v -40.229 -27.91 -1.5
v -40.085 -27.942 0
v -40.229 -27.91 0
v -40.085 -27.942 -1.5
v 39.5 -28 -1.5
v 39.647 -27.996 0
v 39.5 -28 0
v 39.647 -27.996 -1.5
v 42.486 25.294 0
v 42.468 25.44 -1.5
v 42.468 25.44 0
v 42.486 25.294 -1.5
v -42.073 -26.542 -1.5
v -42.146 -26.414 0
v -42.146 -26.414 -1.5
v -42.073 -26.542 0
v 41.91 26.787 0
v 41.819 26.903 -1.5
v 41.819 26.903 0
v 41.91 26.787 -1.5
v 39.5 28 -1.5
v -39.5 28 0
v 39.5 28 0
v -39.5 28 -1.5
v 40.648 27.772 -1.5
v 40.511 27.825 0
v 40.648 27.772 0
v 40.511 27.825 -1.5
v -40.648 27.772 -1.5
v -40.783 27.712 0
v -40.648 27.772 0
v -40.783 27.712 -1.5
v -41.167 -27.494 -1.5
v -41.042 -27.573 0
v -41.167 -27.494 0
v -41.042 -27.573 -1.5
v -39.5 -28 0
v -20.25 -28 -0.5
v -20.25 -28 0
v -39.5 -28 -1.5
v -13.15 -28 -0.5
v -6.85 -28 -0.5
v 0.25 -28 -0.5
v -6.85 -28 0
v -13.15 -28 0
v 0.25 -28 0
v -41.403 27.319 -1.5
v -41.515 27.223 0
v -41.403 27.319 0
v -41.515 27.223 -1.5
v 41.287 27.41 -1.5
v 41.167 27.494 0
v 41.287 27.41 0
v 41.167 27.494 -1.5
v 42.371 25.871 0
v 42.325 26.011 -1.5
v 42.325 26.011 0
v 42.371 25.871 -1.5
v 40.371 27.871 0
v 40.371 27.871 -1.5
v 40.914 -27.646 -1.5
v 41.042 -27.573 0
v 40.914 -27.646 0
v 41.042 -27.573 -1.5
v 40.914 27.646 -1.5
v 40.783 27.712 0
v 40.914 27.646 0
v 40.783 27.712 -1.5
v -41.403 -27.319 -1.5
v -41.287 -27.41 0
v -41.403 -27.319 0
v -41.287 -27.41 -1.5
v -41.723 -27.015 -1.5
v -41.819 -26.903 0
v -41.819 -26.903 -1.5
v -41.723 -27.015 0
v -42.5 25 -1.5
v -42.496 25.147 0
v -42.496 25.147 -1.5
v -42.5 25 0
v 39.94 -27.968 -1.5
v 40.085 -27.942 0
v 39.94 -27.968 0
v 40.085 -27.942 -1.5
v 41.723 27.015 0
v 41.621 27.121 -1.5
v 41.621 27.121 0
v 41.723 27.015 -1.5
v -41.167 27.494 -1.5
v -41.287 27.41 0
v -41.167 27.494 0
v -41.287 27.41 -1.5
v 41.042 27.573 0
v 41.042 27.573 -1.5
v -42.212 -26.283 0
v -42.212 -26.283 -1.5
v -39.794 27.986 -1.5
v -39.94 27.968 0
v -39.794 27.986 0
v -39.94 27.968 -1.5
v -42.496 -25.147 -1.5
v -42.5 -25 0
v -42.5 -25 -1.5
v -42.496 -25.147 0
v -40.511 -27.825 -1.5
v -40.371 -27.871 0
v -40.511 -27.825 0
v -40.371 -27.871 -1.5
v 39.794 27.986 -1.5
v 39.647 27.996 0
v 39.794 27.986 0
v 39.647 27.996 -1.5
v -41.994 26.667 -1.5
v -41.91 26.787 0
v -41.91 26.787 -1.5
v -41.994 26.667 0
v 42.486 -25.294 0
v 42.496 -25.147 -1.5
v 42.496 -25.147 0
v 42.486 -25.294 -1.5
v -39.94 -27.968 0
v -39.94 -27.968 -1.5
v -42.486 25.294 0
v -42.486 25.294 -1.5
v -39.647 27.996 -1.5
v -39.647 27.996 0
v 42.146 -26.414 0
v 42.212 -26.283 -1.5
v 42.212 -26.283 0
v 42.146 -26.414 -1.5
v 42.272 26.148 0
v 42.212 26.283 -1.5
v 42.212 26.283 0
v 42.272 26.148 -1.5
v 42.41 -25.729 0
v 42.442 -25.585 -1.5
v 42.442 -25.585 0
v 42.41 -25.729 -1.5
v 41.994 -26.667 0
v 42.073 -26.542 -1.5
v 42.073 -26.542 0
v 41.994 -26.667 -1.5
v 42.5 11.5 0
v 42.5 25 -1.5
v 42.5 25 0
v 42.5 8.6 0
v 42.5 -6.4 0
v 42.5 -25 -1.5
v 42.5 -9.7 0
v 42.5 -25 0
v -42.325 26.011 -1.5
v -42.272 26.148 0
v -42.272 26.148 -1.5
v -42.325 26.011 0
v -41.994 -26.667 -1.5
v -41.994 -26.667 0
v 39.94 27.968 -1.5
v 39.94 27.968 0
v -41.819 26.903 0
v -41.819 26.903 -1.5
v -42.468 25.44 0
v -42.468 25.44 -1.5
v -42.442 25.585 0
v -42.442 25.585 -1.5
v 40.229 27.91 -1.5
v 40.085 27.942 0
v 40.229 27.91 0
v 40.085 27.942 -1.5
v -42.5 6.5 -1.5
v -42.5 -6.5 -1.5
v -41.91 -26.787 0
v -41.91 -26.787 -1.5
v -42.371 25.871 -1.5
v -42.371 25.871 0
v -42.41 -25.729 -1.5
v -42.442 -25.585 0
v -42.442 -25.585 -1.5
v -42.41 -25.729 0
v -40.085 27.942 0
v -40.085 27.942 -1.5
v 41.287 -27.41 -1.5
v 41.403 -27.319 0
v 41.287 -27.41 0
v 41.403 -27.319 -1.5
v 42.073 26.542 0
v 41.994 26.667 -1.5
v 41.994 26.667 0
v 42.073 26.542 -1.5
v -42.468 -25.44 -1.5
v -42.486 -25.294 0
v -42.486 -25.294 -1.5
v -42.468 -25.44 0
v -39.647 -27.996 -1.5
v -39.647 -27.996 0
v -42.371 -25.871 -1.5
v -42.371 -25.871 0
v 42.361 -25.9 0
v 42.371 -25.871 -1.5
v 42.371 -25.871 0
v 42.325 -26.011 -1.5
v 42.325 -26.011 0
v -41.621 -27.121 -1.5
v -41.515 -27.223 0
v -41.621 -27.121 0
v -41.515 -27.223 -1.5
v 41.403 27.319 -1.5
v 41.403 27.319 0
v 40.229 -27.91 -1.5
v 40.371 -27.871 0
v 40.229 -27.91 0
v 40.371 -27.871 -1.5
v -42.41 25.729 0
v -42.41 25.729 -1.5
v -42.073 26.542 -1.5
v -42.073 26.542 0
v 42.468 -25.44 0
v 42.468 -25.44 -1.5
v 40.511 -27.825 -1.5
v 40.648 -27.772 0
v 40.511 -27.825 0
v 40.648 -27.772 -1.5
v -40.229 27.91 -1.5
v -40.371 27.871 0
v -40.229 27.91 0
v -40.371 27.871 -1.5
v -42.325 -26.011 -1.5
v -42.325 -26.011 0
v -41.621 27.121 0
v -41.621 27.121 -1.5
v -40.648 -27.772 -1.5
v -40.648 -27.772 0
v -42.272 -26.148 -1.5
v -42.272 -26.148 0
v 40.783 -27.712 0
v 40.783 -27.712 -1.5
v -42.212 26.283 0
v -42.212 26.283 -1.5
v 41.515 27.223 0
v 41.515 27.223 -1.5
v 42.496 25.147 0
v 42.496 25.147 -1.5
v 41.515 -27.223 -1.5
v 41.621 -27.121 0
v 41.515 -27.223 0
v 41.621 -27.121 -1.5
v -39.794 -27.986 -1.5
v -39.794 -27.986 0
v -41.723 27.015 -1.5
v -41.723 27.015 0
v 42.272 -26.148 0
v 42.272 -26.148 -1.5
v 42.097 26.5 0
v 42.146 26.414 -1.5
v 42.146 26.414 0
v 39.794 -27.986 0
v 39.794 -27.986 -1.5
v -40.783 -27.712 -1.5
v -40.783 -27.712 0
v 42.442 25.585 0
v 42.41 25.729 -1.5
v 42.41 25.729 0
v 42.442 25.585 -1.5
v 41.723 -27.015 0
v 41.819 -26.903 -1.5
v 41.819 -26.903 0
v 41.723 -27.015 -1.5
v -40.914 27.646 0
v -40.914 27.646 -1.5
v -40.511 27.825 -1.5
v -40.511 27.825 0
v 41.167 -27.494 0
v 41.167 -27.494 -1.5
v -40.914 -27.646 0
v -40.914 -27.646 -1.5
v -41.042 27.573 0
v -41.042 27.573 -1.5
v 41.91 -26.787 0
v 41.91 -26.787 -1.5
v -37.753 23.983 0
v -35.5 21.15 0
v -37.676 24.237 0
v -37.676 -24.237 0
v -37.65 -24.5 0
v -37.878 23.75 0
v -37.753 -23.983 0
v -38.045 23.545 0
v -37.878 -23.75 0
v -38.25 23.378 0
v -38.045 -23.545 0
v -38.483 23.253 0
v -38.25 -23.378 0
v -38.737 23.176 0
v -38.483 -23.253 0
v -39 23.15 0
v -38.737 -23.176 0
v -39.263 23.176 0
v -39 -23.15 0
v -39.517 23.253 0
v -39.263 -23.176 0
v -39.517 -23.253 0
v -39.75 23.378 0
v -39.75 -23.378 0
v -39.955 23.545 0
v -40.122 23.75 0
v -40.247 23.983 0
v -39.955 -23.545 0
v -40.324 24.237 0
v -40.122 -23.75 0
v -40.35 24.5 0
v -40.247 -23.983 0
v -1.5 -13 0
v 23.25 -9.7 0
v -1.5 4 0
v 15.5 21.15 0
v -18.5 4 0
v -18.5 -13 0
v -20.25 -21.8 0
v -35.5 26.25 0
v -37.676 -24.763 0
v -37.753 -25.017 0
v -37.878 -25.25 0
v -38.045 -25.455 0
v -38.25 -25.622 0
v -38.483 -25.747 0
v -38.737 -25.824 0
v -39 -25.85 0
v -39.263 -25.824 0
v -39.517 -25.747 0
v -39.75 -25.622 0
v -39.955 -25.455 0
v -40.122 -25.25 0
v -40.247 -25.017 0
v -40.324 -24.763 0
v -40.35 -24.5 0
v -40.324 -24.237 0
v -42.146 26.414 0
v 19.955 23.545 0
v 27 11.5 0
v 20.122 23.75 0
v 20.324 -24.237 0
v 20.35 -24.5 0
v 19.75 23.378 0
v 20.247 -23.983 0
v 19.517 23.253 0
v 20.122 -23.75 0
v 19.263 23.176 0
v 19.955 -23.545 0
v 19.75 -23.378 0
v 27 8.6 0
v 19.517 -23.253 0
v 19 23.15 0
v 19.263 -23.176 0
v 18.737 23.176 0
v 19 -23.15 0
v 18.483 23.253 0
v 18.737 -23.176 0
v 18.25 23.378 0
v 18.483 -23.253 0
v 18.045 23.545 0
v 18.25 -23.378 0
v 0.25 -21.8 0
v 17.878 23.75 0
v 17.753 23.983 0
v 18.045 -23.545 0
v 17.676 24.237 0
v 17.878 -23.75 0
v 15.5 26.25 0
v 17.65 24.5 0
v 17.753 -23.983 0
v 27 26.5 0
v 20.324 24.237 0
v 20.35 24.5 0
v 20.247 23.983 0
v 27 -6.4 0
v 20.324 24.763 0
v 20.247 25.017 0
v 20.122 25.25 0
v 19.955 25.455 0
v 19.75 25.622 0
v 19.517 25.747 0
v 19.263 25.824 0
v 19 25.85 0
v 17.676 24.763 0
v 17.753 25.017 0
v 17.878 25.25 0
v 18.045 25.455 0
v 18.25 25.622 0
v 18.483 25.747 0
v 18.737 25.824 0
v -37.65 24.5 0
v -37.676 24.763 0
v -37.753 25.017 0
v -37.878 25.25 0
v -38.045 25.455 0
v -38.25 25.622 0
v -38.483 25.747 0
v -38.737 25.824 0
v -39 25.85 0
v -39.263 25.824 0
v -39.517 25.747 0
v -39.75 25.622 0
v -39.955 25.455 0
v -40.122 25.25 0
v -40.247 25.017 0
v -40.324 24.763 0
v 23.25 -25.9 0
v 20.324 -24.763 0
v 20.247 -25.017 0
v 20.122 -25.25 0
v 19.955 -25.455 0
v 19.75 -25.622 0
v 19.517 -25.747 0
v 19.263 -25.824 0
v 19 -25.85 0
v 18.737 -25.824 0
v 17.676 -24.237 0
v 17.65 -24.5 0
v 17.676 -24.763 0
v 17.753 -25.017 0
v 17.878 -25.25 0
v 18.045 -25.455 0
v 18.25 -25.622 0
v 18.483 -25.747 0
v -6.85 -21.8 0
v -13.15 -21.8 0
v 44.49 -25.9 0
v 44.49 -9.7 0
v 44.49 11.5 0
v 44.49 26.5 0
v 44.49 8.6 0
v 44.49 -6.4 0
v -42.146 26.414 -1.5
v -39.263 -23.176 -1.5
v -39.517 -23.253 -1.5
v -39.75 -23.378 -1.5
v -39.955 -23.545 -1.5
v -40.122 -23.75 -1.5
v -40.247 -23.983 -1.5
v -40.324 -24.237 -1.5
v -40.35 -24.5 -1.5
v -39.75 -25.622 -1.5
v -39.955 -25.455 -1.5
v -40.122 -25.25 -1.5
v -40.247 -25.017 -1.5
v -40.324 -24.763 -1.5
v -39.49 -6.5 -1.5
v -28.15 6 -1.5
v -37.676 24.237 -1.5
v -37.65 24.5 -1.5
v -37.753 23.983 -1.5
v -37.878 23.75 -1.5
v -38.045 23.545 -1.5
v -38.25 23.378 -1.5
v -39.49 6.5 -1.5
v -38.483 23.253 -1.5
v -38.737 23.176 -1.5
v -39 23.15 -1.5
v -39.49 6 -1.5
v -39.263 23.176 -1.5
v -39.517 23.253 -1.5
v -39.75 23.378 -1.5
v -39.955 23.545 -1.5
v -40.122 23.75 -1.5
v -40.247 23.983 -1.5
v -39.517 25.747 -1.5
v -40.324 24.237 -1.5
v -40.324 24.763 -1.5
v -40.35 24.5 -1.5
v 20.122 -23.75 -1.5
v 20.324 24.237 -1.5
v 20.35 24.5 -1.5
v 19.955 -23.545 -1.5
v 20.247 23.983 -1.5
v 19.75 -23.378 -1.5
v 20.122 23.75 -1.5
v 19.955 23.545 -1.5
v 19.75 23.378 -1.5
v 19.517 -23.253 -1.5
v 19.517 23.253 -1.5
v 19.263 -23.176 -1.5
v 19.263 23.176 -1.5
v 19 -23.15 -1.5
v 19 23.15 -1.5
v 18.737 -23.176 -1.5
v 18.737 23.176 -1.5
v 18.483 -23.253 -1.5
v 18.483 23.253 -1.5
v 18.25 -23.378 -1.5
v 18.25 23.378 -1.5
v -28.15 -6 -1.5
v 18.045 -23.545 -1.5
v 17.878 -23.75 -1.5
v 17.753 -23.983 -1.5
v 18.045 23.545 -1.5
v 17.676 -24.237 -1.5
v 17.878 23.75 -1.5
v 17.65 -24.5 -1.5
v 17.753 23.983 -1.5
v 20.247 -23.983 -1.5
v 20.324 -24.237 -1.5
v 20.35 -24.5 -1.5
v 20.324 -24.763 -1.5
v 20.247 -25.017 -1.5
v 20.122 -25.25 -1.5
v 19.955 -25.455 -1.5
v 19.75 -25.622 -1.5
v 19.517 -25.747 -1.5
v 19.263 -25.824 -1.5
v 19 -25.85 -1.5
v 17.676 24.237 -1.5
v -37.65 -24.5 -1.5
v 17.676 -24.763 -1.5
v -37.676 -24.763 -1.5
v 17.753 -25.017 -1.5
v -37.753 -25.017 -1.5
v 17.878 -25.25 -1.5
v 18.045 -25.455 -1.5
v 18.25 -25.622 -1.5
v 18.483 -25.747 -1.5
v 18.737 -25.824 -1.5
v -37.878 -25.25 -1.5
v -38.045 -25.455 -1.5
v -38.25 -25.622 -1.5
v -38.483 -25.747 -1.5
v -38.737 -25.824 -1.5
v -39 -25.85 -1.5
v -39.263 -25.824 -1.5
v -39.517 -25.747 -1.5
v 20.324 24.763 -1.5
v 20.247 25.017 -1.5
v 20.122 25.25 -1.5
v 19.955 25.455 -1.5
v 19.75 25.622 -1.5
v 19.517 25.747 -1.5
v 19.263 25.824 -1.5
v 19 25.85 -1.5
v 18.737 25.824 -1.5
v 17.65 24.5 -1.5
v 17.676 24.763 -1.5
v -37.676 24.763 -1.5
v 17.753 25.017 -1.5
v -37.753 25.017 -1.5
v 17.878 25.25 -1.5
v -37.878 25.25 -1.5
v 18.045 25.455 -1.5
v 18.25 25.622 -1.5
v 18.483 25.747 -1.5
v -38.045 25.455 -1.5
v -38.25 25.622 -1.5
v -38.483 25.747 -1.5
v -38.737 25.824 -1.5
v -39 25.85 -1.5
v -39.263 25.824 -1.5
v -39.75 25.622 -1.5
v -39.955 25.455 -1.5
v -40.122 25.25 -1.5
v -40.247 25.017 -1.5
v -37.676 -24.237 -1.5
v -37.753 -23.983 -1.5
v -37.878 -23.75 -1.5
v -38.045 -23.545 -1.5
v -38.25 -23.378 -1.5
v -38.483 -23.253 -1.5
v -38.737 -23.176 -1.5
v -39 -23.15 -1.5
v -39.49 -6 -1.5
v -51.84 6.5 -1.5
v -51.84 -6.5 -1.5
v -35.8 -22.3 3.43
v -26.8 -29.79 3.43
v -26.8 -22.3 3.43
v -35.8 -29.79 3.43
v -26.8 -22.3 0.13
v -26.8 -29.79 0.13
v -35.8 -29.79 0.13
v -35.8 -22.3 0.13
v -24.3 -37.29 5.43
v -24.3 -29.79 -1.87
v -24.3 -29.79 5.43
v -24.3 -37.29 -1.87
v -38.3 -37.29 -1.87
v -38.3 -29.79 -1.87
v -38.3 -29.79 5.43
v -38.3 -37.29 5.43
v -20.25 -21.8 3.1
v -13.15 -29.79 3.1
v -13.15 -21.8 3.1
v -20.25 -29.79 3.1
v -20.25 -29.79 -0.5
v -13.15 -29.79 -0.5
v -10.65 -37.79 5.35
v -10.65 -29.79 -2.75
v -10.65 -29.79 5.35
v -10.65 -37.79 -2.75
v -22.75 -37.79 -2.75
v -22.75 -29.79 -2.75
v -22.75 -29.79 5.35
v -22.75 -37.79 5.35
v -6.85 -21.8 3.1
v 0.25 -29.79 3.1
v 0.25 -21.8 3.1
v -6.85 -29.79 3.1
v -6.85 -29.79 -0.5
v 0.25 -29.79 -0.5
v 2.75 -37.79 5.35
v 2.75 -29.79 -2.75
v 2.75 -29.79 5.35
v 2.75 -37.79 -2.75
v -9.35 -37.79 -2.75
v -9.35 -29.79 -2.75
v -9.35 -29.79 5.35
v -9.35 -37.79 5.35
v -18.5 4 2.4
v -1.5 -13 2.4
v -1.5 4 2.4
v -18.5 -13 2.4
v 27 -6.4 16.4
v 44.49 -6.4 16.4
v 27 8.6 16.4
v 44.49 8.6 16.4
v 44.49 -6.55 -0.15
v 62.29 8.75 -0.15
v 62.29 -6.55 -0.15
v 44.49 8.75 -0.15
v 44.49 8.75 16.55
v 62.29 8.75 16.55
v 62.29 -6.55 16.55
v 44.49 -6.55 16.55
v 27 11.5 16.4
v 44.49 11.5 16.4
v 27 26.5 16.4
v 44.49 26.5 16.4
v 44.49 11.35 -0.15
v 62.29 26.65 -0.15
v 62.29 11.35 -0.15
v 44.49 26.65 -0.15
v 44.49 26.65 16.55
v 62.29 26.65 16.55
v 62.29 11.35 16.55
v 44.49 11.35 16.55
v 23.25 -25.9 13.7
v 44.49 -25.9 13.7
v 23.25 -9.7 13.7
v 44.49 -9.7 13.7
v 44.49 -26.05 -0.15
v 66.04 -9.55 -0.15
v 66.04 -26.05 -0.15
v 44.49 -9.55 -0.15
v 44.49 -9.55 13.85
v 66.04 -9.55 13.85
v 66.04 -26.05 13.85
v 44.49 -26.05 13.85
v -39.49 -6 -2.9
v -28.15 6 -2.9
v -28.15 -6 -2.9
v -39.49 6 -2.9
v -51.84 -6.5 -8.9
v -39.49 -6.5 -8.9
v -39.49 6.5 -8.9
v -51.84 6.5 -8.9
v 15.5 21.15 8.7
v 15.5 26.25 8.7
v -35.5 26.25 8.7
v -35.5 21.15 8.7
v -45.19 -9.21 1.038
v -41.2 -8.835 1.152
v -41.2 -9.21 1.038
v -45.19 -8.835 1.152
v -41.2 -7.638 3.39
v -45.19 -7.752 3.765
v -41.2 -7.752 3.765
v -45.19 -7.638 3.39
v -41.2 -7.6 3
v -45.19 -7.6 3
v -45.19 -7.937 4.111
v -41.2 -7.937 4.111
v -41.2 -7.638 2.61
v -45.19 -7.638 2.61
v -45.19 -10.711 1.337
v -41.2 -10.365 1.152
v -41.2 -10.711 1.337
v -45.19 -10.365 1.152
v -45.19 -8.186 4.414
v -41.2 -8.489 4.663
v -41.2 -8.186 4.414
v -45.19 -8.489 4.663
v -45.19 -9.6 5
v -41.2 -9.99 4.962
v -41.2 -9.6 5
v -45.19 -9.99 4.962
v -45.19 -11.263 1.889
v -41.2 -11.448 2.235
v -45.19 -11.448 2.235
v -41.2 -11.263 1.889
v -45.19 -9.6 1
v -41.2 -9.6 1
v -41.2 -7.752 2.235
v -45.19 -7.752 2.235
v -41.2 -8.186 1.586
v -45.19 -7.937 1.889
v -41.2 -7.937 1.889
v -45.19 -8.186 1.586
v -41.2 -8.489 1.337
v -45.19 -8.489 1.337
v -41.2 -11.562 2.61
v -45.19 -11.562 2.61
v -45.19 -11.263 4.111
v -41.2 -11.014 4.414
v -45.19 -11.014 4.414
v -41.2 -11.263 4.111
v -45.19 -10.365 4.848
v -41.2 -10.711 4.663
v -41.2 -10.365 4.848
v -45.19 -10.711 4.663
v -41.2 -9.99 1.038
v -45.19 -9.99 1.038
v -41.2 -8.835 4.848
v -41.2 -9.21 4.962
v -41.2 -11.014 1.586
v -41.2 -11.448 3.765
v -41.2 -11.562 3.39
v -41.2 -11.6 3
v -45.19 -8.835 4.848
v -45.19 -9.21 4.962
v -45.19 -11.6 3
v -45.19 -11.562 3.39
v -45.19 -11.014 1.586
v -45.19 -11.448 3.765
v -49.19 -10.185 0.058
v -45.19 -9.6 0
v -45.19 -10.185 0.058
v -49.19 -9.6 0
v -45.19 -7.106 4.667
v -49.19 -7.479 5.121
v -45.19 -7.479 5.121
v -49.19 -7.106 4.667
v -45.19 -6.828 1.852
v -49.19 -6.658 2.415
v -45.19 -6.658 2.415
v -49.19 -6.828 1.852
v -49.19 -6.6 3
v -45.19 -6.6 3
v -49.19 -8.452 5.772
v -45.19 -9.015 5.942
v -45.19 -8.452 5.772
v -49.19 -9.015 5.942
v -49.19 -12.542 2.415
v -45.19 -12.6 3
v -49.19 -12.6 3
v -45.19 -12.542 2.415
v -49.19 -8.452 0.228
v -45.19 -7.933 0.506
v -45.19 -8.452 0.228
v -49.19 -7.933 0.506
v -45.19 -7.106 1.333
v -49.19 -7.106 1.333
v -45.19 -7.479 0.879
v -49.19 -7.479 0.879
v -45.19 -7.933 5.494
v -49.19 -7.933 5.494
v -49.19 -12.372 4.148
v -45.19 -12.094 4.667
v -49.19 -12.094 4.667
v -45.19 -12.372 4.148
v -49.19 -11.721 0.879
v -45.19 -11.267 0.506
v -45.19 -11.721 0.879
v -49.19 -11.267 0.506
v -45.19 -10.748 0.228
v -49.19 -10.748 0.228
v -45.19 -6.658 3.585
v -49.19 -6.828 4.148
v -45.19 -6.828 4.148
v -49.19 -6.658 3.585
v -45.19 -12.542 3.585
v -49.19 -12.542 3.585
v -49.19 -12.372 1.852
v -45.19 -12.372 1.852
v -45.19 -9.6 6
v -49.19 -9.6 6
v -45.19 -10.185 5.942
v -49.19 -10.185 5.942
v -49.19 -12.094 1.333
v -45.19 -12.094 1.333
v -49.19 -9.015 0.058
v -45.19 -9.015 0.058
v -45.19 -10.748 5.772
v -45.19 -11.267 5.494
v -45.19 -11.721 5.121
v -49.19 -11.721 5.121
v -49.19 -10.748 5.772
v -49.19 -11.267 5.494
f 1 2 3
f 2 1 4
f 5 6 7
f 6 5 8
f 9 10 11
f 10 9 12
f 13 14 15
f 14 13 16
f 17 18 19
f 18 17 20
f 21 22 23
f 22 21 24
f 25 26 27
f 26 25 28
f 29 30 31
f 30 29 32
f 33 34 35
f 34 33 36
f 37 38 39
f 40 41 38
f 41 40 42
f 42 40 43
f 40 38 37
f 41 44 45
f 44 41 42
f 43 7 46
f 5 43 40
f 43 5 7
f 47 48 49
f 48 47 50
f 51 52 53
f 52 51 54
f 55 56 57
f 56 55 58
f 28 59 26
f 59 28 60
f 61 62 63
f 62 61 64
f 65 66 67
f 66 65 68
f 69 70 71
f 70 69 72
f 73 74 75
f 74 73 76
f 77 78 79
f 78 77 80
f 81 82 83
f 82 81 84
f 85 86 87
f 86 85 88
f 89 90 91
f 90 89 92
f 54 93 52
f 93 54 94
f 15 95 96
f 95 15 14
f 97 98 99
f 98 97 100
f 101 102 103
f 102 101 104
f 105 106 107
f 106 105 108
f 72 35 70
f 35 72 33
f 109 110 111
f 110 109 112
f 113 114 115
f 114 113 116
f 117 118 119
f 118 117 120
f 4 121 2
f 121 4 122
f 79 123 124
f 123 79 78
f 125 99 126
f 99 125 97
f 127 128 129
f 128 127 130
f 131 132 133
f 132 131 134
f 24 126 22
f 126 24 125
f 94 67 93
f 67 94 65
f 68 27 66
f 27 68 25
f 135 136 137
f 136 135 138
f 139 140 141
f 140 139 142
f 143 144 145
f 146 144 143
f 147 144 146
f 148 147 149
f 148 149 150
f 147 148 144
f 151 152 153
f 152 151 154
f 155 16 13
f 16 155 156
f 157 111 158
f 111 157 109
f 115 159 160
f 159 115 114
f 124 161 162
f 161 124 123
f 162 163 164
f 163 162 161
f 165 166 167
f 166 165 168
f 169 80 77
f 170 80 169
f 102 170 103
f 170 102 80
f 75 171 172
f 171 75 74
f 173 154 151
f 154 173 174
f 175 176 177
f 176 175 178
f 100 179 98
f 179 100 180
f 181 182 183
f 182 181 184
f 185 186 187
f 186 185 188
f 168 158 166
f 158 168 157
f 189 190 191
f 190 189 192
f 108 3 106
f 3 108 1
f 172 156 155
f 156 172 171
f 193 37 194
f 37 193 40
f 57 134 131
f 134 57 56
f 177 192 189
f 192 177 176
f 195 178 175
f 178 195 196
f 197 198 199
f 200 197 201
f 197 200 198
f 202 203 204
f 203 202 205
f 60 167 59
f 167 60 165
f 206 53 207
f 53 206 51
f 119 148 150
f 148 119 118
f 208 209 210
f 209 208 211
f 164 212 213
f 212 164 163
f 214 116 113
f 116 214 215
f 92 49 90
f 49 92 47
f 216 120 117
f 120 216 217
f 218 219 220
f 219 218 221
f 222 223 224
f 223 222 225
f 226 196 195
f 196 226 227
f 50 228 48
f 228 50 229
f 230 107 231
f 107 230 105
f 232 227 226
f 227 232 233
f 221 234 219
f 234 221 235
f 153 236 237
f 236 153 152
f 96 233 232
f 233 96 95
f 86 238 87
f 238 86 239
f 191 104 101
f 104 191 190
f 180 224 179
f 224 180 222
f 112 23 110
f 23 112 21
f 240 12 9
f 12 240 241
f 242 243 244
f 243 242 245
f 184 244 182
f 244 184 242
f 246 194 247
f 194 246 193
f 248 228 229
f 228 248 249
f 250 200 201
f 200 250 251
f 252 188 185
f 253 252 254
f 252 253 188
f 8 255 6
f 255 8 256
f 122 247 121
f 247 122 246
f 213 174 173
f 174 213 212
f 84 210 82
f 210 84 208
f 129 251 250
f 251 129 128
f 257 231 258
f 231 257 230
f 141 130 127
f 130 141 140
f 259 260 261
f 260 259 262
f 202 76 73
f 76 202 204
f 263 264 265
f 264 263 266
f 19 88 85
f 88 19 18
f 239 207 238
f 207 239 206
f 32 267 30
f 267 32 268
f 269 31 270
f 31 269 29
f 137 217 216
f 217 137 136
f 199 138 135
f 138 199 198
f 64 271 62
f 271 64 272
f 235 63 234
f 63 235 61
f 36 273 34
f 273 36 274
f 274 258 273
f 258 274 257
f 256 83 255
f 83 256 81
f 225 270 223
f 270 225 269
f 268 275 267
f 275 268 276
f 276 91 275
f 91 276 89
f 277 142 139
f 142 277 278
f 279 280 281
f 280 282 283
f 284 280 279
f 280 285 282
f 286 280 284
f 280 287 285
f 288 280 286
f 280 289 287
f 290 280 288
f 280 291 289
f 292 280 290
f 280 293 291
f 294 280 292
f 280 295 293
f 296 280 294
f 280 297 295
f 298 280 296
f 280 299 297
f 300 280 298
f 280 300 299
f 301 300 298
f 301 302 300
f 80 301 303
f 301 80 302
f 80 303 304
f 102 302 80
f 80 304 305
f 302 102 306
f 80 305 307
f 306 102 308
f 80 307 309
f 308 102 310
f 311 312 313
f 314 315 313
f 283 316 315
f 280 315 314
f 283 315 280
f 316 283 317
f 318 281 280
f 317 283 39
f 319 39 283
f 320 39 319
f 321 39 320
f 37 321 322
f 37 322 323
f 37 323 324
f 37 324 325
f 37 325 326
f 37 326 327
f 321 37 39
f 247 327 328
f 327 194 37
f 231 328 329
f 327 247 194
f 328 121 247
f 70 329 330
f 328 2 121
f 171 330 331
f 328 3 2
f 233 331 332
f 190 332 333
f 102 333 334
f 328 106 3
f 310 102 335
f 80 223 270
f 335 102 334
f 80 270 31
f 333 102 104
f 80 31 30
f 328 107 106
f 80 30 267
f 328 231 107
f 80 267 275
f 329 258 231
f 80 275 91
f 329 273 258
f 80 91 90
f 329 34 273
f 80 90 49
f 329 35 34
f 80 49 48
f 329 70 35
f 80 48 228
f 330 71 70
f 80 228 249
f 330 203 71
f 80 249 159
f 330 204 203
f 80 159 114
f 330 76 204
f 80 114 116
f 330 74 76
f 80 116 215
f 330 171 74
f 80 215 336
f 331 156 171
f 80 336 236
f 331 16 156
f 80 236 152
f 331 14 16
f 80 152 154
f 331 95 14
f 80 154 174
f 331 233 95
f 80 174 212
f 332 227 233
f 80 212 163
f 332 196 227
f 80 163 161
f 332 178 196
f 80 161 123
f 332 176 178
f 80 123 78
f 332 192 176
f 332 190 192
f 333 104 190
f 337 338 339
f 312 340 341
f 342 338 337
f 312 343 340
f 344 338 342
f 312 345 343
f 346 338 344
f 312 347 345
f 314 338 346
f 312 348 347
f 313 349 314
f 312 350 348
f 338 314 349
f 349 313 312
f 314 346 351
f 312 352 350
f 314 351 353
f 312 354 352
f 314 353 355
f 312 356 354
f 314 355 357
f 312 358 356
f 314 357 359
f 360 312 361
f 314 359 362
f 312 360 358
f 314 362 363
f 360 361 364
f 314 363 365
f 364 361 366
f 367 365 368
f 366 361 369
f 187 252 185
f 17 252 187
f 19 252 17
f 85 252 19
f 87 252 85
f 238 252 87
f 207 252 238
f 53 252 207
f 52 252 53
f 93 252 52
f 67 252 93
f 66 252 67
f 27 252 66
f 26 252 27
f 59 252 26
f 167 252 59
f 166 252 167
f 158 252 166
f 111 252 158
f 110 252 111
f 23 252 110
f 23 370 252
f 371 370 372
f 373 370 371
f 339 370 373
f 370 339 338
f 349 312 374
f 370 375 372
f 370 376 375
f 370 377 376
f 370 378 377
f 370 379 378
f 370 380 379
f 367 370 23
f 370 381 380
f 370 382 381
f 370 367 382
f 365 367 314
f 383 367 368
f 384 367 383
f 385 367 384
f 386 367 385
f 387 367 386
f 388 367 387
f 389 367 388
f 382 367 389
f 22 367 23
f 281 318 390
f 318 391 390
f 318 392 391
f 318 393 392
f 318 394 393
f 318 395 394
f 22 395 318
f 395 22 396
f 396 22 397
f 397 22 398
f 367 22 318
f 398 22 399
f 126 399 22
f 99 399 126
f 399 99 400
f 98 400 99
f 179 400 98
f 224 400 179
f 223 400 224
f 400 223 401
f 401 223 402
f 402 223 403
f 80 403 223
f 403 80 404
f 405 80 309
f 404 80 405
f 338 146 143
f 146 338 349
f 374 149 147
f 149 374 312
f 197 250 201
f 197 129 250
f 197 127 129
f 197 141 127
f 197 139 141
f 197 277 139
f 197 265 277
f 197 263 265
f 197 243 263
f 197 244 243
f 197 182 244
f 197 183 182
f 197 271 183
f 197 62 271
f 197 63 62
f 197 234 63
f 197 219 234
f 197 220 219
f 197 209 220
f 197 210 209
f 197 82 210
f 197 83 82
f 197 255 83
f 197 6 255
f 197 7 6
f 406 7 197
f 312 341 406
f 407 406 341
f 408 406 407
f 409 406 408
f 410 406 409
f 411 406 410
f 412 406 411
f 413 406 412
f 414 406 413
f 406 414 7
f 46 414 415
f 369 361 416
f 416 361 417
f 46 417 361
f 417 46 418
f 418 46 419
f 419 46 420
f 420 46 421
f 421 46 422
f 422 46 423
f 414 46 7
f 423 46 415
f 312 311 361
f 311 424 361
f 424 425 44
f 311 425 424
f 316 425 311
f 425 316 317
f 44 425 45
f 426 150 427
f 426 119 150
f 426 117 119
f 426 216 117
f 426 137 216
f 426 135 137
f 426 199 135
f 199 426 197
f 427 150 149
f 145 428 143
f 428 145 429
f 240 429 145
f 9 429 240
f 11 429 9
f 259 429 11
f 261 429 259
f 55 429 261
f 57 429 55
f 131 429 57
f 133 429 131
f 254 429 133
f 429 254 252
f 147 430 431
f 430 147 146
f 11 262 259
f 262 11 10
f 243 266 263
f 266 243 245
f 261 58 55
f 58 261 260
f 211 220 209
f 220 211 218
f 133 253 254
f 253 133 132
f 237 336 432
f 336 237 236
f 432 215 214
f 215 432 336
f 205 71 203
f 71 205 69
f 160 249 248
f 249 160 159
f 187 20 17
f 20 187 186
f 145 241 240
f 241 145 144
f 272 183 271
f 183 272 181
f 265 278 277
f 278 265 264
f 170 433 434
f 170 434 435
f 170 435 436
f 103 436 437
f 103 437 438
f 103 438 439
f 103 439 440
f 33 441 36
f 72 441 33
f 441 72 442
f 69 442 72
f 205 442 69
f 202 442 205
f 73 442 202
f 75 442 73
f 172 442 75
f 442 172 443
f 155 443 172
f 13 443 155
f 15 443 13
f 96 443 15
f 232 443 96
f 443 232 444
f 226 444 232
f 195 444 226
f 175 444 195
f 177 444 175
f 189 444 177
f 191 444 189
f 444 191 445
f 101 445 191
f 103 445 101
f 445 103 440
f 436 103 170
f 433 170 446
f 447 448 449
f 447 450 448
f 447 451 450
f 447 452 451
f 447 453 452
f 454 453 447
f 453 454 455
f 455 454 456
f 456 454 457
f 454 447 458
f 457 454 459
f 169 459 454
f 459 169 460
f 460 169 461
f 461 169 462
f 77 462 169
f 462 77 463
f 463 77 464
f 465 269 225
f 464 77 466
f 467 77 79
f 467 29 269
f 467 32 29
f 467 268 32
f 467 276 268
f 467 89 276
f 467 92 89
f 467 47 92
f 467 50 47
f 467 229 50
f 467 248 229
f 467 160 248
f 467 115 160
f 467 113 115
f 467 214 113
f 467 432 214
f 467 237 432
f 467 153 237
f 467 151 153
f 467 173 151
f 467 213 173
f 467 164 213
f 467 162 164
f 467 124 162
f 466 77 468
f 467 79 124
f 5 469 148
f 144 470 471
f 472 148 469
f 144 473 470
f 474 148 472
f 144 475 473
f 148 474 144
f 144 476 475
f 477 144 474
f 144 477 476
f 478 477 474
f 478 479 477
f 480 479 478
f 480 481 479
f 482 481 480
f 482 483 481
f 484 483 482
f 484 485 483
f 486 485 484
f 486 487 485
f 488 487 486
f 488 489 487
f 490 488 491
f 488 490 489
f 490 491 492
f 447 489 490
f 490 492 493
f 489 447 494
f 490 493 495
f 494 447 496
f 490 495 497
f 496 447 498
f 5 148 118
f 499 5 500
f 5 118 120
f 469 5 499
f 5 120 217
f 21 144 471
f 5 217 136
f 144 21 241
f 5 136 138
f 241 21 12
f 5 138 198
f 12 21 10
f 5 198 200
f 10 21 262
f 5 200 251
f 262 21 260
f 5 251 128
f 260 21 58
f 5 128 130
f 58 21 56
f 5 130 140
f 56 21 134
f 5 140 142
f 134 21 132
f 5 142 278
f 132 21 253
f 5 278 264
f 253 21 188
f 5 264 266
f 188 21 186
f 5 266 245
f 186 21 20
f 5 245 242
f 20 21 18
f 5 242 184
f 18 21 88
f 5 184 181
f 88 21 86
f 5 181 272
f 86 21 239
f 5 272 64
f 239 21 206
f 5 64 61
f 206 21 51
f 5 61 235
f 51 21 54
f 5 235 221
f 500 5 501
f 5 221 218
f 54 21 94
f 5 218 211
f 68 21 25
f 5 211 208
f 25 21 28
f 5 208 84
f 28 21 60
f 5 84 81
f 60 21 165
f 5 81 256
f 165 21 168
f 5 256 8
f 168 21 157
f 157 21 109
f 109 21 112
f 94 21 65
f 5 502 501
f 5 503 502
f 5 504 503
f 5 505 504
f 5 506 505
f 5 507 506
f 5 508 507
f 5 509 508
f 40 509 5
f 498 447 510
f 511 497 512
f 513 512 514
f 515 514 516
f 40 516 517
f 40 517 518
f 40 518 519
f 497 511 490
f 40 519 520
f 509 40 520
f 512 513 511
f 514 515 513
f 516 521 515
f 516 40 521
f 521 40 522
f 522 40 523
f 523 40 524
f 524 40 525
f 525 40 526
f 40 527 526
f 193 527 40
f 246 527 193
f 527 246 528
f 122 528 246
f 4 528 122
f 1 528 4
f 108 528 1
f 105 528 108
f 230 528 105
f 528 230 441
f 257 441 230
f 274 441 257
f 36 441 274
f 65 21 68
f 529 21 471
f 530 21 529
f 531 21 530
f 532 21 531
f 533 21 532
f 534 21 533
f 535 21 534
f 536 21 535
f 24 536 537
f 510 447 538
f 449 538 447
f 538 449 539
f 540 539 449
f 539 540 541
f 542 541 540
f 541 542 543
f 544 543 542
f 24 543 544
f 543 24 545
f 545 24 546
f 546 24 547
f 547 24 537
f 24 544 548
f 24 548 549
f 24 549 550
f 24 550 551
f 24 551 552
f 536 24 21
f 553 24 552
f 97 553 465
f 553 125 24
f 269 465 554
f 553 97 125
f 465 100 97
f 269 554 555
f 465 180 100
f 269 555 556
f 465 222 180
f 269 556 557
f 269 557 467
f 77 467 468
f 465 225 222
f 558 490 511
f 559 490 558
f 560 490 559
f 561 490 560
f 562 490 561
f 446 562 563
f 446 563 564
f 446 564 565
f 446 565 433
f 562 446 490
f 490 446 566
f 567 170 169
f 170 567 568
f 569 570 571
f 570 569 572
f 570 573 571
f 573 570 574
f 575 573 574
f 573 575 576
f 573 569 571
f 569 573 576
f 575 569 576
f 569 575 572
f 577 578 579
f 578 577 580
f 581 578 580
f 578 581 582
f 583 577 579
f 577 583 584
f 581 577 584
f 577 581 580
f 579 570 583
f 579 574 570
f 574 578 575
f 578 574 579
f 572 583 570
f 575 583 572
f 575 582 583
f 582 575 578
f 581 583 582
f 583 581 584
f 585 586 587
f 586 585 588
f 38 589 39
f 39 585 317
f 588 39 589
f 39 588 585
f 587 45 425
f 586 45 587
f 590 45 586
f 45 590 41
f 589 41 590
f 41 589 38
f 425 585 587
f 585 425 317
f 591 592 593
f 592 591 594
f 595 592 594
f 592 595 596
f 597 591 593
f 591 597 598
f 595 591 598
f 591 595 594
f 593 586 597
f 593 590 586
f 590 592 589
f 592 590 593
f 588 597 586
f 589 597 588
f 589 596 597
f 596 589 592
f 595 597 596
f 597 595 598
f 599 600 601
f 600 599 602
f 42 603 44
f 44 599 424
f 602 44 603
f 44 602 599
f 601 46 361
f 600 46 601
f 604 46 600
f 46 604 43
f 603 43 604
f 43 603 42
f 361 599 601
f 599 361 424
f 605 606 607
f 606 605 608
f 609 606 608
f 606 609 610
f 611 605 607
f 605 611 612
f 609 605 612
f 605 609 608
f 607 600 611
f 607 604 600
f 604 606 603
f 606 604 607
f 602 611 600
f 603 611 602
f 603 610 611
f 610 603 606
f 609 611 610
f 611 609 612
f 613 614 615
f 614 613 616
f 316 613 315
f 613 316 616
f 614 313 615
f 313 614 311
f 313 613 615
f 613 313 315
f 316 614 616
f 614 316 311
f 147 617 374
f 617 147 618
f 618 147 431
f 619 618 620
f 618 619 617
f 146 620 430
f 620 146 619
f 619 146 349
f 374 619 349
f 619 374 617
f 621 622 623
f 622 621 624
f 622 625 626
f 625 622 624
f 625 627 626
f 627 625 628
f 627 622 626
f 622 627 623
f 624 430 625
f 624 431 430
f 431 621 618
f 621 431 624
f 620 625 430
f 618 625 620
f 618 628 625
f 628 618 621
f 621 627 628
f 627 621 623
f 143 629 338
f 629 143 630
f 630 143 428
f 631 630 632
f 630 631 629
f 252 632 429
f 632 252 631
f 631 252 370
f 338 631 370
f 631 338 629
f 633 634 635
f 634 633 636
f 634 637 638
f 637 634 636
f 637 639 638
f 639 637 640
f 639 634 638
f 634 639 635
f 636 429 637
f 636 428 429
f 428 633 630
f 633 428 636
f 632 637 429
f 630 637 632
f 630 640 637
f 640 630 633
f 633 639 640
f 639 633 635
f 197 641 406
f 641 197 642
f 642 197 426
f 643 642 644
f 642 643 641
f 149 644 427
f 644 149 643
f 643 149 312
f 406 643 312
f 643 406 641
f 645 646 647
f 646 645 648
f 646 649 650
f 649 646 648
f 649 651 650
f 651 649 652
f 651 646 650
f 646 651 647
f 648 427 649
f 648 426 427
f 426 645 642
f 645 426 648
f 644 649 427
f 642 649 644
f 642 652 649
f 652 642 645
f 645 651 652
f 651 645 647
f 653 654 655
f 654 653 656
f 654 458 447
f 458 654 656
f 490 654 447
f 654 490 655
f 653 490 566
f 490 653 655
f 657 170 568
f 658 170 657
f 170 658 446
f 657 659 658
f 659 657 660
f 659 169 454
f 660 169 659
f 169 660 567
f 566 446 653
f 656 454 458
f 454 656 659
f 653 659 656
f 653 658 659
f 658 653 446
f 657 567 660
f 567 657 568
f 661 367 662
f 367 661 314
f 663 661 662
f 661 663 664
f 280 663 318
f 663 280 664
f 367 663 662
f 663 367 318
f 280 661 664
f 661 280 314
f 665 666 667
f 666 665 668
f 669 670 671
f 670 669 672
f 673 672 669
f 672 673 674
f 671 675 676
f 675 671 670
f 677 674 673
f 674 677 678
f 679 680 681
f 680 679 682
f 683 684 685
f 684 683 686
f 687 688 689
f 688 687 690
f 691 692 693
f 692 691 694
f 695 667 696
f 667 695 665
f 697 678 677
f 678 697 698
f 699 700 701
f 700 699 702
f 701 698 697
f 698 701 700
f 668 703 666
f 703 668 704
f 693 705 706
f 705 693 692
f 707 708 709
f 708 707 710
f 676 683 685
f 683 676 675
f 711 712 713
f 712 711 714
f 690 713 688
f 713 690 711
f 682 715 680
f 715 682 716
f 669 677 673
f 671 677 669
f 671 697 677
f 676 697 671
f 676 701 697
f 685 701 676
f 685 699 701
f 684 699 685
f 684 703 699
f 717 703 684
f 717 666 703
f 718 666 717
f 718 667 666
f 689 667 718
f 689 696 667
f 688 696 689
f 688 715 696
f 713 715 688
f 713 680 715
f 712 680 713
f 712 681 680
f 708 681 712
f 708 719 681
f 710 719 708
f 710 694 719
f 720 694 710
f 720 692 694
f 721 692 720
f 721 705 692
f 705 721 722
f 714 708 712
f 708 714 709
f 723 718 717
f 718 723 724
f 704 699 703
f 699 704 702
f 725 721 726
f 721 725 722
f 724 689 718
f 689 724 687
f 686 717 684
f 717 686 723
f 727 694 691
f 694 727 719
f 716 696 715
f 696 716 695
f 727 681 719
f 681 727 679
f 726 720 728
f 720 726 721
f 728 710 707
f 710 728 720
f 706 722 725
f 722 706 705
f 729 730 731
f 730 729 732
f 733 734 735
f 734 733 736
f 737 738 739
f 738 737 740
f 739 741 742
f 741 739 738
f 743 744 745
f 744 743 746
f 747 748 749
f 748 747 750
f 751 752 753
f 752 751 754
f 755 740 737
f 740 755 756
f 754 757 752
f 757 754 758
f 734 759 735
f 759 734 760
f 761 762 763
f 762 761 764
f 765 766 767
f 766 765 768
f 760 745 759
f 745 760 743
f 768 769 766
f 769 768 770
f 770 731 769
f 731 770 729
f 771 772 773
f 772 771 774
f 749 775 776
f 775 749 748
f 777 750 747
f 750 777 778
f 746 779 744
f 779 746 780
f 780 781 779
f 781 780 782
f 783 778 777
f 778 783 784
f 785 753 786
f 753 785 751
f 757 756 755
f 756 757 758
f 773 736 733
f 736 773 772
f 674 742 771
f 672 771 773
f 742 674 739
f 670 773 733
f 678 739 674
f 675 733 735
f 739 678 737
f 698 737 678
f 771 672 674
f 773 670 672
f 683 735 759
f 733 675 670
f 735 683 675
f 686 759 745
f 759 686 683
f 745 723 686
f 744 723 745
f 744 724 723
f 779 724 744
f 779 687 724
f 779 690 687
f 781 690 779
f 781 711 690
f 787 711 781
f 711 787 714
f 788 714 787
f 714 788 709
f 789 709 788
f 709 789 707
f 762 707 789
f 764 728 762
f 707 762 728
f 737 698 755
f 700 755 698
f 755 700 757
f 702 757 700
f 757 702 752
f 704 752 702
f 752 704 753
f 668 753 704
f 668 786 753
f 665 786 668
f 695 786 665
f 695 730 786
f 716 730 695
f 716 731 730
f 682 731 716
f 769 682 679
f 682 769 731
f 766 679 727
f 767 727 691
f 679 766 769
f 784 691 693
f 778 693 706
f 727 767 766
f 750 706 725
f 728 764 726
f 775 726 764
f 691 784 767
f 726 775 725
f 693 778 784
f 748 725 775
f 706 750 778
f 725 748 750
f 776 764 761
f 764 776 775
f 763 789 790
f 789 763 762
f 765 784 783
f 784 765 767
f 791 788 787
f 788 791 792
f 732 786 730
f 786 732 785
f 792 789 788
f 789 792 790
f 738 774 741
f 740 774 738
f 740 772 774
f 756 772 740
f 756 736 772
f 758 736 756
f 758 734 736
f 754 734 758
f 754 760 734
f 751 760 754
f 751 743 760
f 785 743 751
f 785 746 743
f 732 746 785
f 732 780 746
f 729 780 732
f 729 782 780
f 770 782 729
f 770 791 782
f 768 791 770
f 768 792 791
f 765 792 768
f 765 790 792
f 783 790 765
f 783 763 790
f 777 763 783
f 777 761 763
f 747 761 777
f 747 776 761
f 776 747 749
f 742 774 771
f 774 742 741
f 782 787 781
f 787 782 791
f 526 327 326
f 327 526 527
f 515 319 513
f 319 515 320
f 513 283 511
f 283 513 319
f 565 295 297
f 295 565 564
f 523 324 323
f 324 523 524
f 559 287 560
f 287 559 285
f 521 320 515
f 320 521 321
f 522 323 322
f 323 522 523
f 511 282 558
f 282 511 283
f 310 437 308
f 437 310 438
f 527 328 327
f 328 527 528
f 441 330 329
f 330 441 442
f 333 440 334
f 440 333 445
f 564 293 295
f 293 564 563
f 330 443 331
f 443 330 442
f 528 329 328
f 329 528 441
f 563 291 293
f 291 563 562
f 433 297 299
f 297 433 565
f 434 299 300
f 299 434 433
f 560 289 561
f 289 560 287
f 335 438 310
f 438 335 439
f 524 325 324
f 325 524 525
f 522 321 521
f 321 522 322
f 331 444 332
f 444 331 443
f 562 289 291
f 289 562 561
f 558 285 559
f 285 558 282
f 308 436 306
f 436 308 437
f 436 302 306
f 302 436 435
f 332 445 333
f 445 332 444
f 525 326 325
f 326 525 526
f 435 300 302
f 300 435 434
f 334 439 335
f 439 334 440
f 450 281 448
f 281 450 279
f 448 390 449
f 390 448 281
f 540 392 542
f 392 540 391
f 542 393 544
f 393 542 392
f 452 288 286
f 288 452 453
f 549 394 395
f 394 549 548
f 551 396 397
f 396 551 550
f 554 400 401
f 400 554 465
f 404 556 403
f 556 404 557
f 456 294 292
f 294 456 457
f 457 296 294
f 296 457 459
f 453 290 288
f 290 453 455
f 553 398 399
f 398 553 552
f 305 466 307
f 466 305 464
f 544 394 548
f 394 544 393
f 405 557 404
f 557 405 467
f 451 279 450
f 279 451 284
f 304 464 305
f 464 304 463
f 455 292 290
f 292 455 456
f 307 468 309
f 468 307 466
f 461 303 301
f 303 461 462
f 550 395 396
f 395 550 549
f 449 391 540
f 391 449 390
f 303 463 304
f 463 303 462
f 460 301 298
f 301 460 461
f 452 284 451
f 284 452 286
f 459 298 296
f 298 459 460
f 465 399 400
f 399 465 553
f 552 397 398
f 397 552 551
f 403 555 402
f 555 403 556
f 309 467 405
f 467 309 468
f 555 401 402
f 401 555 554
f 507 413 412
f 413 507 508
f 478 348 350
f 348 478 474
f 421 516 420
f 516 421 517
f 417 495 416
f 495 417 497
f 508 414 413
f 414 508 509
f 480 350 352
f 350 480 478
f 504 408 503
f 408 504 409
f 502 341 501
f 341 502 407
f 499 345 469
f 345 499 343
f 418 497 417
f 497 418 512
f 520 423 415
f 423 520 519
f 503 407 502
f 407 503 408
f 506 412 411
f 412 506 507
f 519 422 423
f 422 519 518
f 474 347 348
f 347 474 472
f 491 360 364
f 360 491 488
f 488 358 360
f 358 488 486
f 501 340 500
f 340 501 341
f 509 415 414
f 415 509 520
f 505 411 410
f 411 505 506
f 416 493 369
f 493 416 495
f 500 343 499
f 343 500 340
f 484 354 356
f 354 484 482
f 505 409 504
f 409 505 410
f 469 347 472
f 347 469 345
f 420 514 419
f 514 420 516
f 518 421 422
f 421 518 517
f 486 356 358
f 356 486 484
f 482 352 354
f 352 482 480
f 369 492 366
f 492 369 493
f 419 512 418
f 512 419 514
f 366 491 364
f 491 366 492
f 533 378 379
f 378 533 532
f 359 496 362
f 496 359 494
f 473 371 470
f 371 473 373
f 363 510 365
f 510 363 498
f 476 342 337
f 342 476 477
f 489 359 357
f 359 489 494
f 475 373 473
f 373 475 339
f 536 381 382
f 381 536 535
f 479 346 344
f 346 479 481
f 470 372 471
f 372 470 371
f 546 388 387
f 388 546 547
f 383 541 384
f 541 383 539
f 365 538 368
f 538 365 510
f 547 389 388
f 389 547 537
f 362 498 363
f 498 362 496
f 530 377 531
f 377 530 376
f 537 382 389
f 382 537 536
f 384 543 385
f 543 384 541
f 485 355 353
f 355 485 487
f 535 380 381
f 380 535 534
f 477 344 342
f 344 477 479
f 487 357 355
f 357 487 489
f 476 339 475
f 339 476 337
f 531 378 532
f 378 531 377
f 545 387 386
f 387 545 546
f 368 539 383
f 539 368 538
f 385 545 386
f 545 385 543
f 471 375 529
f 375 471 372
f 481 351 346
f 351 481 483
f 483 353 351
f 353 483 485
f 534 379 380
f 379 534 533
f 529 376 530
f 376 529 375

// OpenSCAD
// Start: lazy_union
default_5_default_5();
// End: lazy_union

// Modules.

// 'PartMaterial undef-default - default 5.0'
module default_5_default_5() {
  // 'None : _combine_solids_and_holes'
  union() {
    // '_combine_solids_and_holes'
    difference() {
      // 'default : _combine_solids_and_holes'
      union() {
        // 'board'
        multmatrix(m=[[1.0, 0.0, 0.0, 0.0], [0.0, 1.0, 0.0, 0.0], [0.0, 0.0, 1.0, -0.75], [0.0, 0.0, 0.0, 1.0]]) {
          // 'board : _combine_solids_and_holes'
          union() {
            // 'hull'
            multmatrix(m=[[1.0, 0.0, 0.0, -42.5], [0.0, 1.0, 0.0, -28.0], [0.0, 0.0, 1.0, -0.75], [0.0, 0.0, 0.0, 1.0]]) {
              // 'hull : _combine_solids_and_holes'
              union() {
                // 'hull'
                linear_extrude(height=1.5, twist=0.0, slices=4, scale=[1.0, 1.0]) {
                  polygon(points=[[3.0, 0.0], [82.0, 0.0], [82.14720302298225, 0.003613631384482119], [82.29405142098868, 0.014445819983408104], [82.44019142336609, 0.03247047010565529], [82.58527096604838, 0.05764415879030649], [82.7289405397098, 0.08990624041636508], [82.87085403176339, 0.1291789928033702], [83.01066956017667, 0.17536780445093392], [83.14805029709527, 0.228361402466136], [83.28266528029084, 0.2880321206296661], [83.414190210478, 0.35423620695493074], [83.54230823257967, 0.4268141699991794], [83.66671069905881, 0.50559116309236], [83.7870979134773, 0.5903774055580606], [83.90317985249094, 0.6809686399117845], [84.01467686454106, 0.7771466239351184], [84.12132034355965, 0.8786796564403532], [84.22285337606488, 0.9853231354589407], [84.31903136008822, 1.0968201475090595], [84.40962259444194, 1.2129020865226963], [84.49440883690764, 1.33328930094119], [84.57318583000082, 1.4576917674203314], [84.64576379304506, 1.5858097895220038], [84.71196787937033, 1.7173347197091513], [84.77163859753387, 1.8519497029047285], [84.82463219554907, 1.9893304398233378], [84.87082100719662, 2.129145968236611], [84.91009375958363, 2.271059460290207], [84.94235584120969, 2.414729033951614], [84.96752952989435, 2.5598085766339143], [84.98555418001659, 2.705948579011318], [84.99638636861552, 2.8527969770177455], [85.0, 2.9999999999999996], [85.0, 53.0], [84.99638636861552, 53.147203022982254], [84.98555418001659, 53.29405142098868], [84.96752952989435, 53.44019142336609], [84.94235584120969, 53.585270966048384], [84.91009375958363, 53.72894053970979], [84.87082100719662, 53.870854031763386], [84.82463219554906, 54.01066956017666], [84.77163859753387, 54.14805029709527], [84.71196787937033, 54.28266528029084], [84.64576379304506, 54.41419021047799], [84.57318583000081, 54.542308232579664], [84.49440883690764, 54.666710699058804], [84.40962259444193, 54.7870979134773], [84.3190313600882, 54.90317985249093], [84.22285337606488, 55.01467686454105], [84.12132034355965, 55.12132034355964], [84.01467686454106, 55.22285337606487], [83.90317985249094, 55.3190313600882], [83.7870979134773, 55.40962259444193], [83.66671069905881, 55.49440883690763], [83.54230823257966, 55.57318583000081], [83.414190210478, 55.645763793045056], [83.28266528029084, 55.71196787937032], [83.14805029709527, 55.77163859753385], [83.01066956017667, 55.82463219554905], [82.87085403176339, 55.87082100719662], [82.7289405397098, 55.910093759583624], [82.58527096604838, 55.94235584120968], [82.44019142336609, 55.96752952989433], [82.29405142098868, 55.98555418001658], [82.14720302298225, 55.996386368615504], [82.0, 55.999999999999986], [3.0, 56.0], [2.852796977017746, 55.99638636861552], [2.7059485790113182, 55.98555418001659], [2.5598085766339143, 55.96752952989434], [2.4147290339516143, 55.94235584120969], [2.271059460290207, 55.91009375958363], [2.129145968236611, 55.870821007196625], [1.9893304398233378, 55.824632195549064], [1.8519497029047285, 55.77163859753386], [1.717334719709152, 55.711967879370334], [1.5858097895220038, 55.64576379304506], [1.4576917674203314, 55.57318583000082], [1.3332893009411895, 55.49440883690764], [1.2129020865226958, 55.409622594441934], [1.096820147509059, 55.31903136008821], [0.9853231354589402, 55.222853376064876], [0.8786796564403523, 55.121320343559645], [0.777146623935117, 55.01467686454106], [0.6809686399117831, 54.903179852490936], [0.5903774055580588, 54.787097913477304], [0.5055911630923573, 54.66671069905881], [0.4268141699991759, 54.542308232579664], [0.3542362069549263, 54.41419021047799], [0.2880321206296612, 54.28266528029085], [0.22836140246613024, 54.14805029709527], [0.1753678044509277, 54.01066956017666], [0.1291789928033631, 53.870854031763386], [0.08990624041635709, 53.72894053970979], [0.05764415879029716, 53.585270966048384], [0.03247047010564508, 53.44019142336609], [0.014445819983396557, 53.29405142098868], [0.0036136313844692403, 53.147203022982254], [-1.4210854715202004e-14, 53.0], [0.0, 3.0], [0.003613631384483007, 2.852796977017747], [0.014445819983409436, 2.7059485790113182], [0.03247047010565707, 2.559808576633915], [0.05764415879030871, 2.414729033951615], [0.08990624041636819, 2.2710594602902088], [0.1291789928033733, 2.129145968236614], [0.17536780445093747, 1.9893304398233398], [0.22836140246613956, 1.851949702904731], [0.28803212062966965, 1.7173347197091546], [0.35423620695493474, 1.5858097895220071], [0.42681416999918387, 1.4576917674203353], [0.5055911630923635, 1.3332893009411941], [0.5903774055580651, 1.2129020865227003], [0.6809686399117885, 1.0968201475090642], [0.7771466239351228, 0.9853231354589447], [0.8786796564403572, 0.8786796564403576], [0.9853231354589438, 0.7771466239351232], [1.0968201475090622, 0.6809686399117902], [1.2129020865227007, 0.5903774055580646], [1.3332893009411935, 0.5055911630923644], [1.4576917674203347, 0.42681416999918387], [1.5858097895220065, 0.3542362069549352], [1.7173347197091526, 0.28803212062967054], [1.851949702904729, 0.22836140246614045], [1.9893304398233402, 0.17536780445093747], [2.129145968236613, 0.1291789928033733], [2.271059460290208, 0.08990624041636819], [2.414729033951614, 0.05764415879030915], [2.5598085766339156, 0.03247047010565707], [2.7059485790113187, 0.014445819983409436], [2.852796977017746, 0.003613631384483007]]);
                }
              }
            }
          }
        }
        // 'usbC'
        multmatrix(m=[[-1.0, 0.0, 0.0, -26.8], [0.0, -1.0, 0.0, -22.3], [0.0, 0.0, 1.0, 0.13000000000000034], [0.0, 0.0, 0.0, 1.0]]) {
          // 'usbC'
          color(c=[0.0, 1.0, 0.5, 1.0]) {
            // 'usbC : _combine_solids_and_holes'
            union() {
              // 'usbC'
              cube(size=[9.0, 7.5, 3.3]);
            }
          }
        }
        // ('usbC', 'outer')
        multmatrix(m=[[-1.0, 0.0, 0.0, -24.3], [0.0, 1.0, 0.0, -37.29], [0.0, 0.0, -1.0, 5.43], [0.0, 0.0, 0.0, 1.0]]) {
          // "('usbC', 'outer') : _combine_solids_and_holes"
          union() {
            // ('usbC', 'outer')
            cube(size=[14.0, 7.5, 7.3]);
          }
        }
        // 'hdmi1'
        multmatrix(m=[[-1.0, 0.0, 0.0, -13.149999999999999], [0.0, -1.0, 0.0, -21.8], [0.0, 0.0, 1.0, -0.5], [0.0, 0.0, 0.0, 1.0]]) {
          // 'hdmi1'
          color(c=[0.0, 1.0, 0.5, 1.0]) {
            // 'hdmi1 : _combine_solids_and_holes'
            union() {
              // 'hdmi1'
              cube(size=[7.1, 8.0, 3.6]);
            }
          }
        }
        // ('hdmi1', 'outer')
        multmatrix(m=[[-1.0, 0.0, 0.0, -10.649999999999999], [0.0, 1.0, 0.0, -37.79], [0.0, 0.0, -1.0, 5.35], [0.0, 0.0, 0.0, 1.0]]) {
          // "('hdmi1', 'outer') : _combine_solids_and_holes"
          union() {
            // ('hdmi1', 'outer')
            cube(size=[12.1, 8.0, 8.1]);
          }
        }
        // 'hdmi2'
        multmatrix(m=[[-1.0, 0.0, 0.0, 0.25000000000000266], [0.0, -1.0, 0.0, -21.8], [0.0, 0.0, 1.0, -0.5], [0.0, 0.0, 0.0, 1.0]]) {
          // 'hdmi2'
          color(c=[0.0, 1.0, 0.5, 1.0]) {
            // 'hdmi2 : _combine_solids_and_holes'
            union() {
              // 'hdmi2'
              cube(size=[7.1, 8.0, 3.6]);
            }
          }
        }
        // ('hdmi2', 'outer')
        multmatrix(m=[[-1.0, 0.0, 0.0, 2.7500000000000027], [0.0, 1.0, 0.0, -37.79], [0.0, 0.0, -1.0, 5.35], [0.0, 0.0, 0.0, 1.0]]) {
          // "('hdmi2', 'outer') : _combine_solids_and_holes"
          union() {
            // ('hdmi2', 'outer')
            cube(size=[12.1, 8.0, 8.1]);
          }
        }
        // 'cpu'
        multmatrix(m=[[-1.0, 0.0, 0.0, -1.5], [0.0, -1.0, 0.0, 4.0], [0.0, 0.0, 1.0, 0.0], [0.0, 0.0, 0.0, 1.0]]) {
          // 'cpu'
          color(c=[0.0, 1.0, 0.5, 1.0]) {
            // 'cpu : _combine_solids_and_holes'
            union() {
              // 'cpu'
              cube(size=[17.0, 17.0, 2.4]);
            }
          }
        }
        // 'usbA2'
        multmatrix(m=[[0.0, 1.0, 0.0, 27.0], [-1.0, 0.0, 0.0, 8.600000000000001], [0.0, 0.0, 1.0, 0.0], [0.0, 0.0, 0.0, 1.0]]) {
          // 'usbA2'
          color(c=[0.0, 1.0, 0.5, 1.0]) {
            // 'usbA2 : _combine_solids_and_holes'
            union() {
              // 'usbA2'
              cube(size=[15.0, 17.5, 16.4]);
            }
          }
        }
        // ('usbA2', 'outer')
        multmatrix(m=[[0.0, -1.0, 0.0, 62.290000000000006], [-1.0, 0.0, 0.0, 8.750000000000002], [0.0, 0.0, -1.0, 16.549999999999997], [0.0, 0.0, 0.0, 1.0]]) {
          // "('usbA2', 'outer') : _combine_solids_and_holes"
          union() {
            // ('usbA2', 'outer')
            cube(size=[15.3, 17.8, 16.7]);
          }
        }
        // 'usbA3'
        multmatrix(m=[[0.0, 1.0, 0.0, 27.0], [-1.0, 0.0, 0.0, 26.5], [0.0, 0.0, 1.0, 0.0], [0.0, 0.0, 0.0, 1.0]]) {
          // 'usbA3'
          color(c=[0.0, 1.0, 0.5, 1.0]) {
            // 'usbA3 : _combine_solids_and_holes'
            union() {
              // 'usbA3'
              cube(size=[15.0, 17.5, 16.4]);
            }
          }
        }
        // ('usbA3', 'outer')
        multmatrix(m=[[0.0, -1.0, 0.0, 62.290000000000006], [-1.0, 0.0, 0.0, 26.65], [0.0, 0.0, -1.0, 16.549999999999997], [0.0, 0.0, 0.0, 1.0]]) {
          // "('usbA3', 'outer') : _combine_solids_and_holes"
          union() {
            // ('usbA3', 'outer')
            cube(size=[15.3, 17.8, 16.7]);
          }
        }
        // 'rj45'
        multmatrix(m=[[0.0, 1.0, 0.0, 23.25], [-1.0, 0.0, 0.0, -9.700000000000001], [0.0, 0.0, 1.0, 0.0], [0.0, 0.0, 0.0, 1.0]]) {
          // 'rj45'
          color(c=[0.0, 1.0, 0.5, 1.0]) {
            // 'rj45 : _combine_solids_and_holes'
            union() {
              // 'rj45'
              cube(size=[16.2, 21.25, 13.7]);
            }
          }
        }
        // ('rj45', 'outer')
        multmatrix(m=[[0.0, -1.0, 0.0, 66.04], [-1.0, 0.0, 0.0, -9.55], [0.0, 0.0, -1.0, 13.85], [0.0, 0.0, 0.0, 1.0]]) {
          // "('rj45', 'outer') : _combine_solids_and_holes"
          union() {
            // ('rj45', 'outer')
            cube(size=[16.5, 21.55, 14.0]);
          }
        }
        // 'micro_sd'
        multmatrix(m=[[0.0, -1.0, 0.0, -28.15], [-1.0, 0.0, 0.0, 6.0], [0.0, 0.0, -1.0, -1.5], [0.0, 0.0, 0.0, 1.0]]) {
          // 'micro_sd'
          color(c=[0.0, 1.0, 0.5, 1.0]) {
            // 'micro_sd : _combine_solids_and_holes'
            union() {
              // 'micro_sd'
              cube(size=[12.0, 11.35, 1.4]);
            }
          }
        }
        // ('micro_sd', 'outer')
        multmatrix(m=[[0.0, 1.0, 0.0, -51.84], [-1.0, 0.0, 0.0, 6.5], [0.0, 0.0, 1.0, -8.9], [0.0, 0.0, 0.0, 1.0]]) {
          // "('micro_sd', 'outer') : _combine_solids_and_holes"
          union() {
            // ('micro_sd', 'outer')
            cube(size=[13.0, 12.35, 7.4]);
          }
        }
        // 'header100'
        multmatrix(m=[[1.0, 0.0, 0.0, -35.5], [0.0, 1.0, 0.0, 21.15], [0.0, 0.0, 1.0, 0.0], [0.0, 0.0, 0.0, 1.0]]) {
          // 'header100'
          color(c=[0.0, 1.0, 0.5, 1.0]) {
            // 'header100 : _combine_solids_and_holes'
            union() {
              // 'header100'
              cube(size=[51.0, 5.1, 8.7]);
            }
          }
        }
        // 'power_sw'
        multmatrix(m=[[0.0, 0.0, 1.0, -45.2], [1.0, 0.0, 0.0, -9.600000000000001], [0.0, 1.0, 0.0, 3.0], [0.0, 0.0, 0.0, 1.0]]) {
          // 'power_sw'
          color(c=[0.0, 1.0, 0.5, 1.0]) {
            // 'power_sw : _combine_solids_and_holes'
            union() {
              // 'power_sw'
              cylinder(h=4.0, r1=2.0, r2=2.0, center=false, $fn=32);
            }
          }
        }
        // ('power_sw', 'outer')
        multmatrix(m=[[0.0, 0.0, -1.0, -45.190000000000005], [1.0, 0.0, 0.0, -9.600000000000001], [0.0, -1.0, 0.0, 3.0], [0.0, 0.0, 0.0, 1.0]]) {
          // "('power_sw', 'outer') : _combine_solids_and_holes"
          union() {
            // ('power_sw', 'outer')
            cylinder(h=4.0, r1=3.0, r2=3.0, center=false, $fn=32);
          }
        }
      }
      // 'default'
      multmatrix(m=[[1.0, 0.0, 0.0, -39.0], [0.0, -1.0, 0.0, -24.5], [0.0, 0.0, -1.0, 0.02], [0.0, 0.0, 0.0, 1.0]]) {
        // "('mount_hole', 0) : _combine_solids_and_holes"
        union() {
          // ('mount_hole', 0)
          cylinder(h=3.02, r1=1.35, r2=1.35, center=false, $fn=32);
        }
      }
      // 'default'
      multmatrix(m=[[1.0, 0.0, 0.0, -39.0], [0.0, -1.0, 0.0, 24.5], [0.0, 0.0, -1.0, 0.02], [0.0, 0.0, 0.0, 1.0]]) {
        // "('mount_hole', 1) : _combine_solids_and_holes"
        union() {
          // ('mount_hole', 1)
          cylinder(h=3.02, r1=1.35, r2=1.35, center=false, $fn=32);
        }
      }
      // 'default'
      multmatrix(m=[[1.0, 0.0, 0.0, 19.0], [0.0, -1.0, 0.0, -24.5], [0.0, 0.0, -1.0, 0.02], [0.0, 0.0, 0.0, 1.0]]) {
        // "('mount_hole', 2) : _combine_solids_and_holes"
        union() {
          // ('mount_hole', 2)
          cylinder(h=3.02, r1=1.35, r2=1.35, center=false, $fn=32);
        }
      }
      // 'default'
      multmatrix(m=[[1.0, 0.0, 0.0, 19.0], [0.0, -1.0, 0.0, 24.5], [0.0, 0.0, -1.0, 0.02], [0.0, 0.0, 0.0, 1.0]]) {
        // "('mount_hole', 3) : _combine_solids_and_holes"
        union() {
          // ('mount_hole', 3)
          cylinder(h=3.02, r1=1.35, r2=1.35, center=false, $fn=32);
        }
      }
    }
  }
} // end module default_5_default_5
